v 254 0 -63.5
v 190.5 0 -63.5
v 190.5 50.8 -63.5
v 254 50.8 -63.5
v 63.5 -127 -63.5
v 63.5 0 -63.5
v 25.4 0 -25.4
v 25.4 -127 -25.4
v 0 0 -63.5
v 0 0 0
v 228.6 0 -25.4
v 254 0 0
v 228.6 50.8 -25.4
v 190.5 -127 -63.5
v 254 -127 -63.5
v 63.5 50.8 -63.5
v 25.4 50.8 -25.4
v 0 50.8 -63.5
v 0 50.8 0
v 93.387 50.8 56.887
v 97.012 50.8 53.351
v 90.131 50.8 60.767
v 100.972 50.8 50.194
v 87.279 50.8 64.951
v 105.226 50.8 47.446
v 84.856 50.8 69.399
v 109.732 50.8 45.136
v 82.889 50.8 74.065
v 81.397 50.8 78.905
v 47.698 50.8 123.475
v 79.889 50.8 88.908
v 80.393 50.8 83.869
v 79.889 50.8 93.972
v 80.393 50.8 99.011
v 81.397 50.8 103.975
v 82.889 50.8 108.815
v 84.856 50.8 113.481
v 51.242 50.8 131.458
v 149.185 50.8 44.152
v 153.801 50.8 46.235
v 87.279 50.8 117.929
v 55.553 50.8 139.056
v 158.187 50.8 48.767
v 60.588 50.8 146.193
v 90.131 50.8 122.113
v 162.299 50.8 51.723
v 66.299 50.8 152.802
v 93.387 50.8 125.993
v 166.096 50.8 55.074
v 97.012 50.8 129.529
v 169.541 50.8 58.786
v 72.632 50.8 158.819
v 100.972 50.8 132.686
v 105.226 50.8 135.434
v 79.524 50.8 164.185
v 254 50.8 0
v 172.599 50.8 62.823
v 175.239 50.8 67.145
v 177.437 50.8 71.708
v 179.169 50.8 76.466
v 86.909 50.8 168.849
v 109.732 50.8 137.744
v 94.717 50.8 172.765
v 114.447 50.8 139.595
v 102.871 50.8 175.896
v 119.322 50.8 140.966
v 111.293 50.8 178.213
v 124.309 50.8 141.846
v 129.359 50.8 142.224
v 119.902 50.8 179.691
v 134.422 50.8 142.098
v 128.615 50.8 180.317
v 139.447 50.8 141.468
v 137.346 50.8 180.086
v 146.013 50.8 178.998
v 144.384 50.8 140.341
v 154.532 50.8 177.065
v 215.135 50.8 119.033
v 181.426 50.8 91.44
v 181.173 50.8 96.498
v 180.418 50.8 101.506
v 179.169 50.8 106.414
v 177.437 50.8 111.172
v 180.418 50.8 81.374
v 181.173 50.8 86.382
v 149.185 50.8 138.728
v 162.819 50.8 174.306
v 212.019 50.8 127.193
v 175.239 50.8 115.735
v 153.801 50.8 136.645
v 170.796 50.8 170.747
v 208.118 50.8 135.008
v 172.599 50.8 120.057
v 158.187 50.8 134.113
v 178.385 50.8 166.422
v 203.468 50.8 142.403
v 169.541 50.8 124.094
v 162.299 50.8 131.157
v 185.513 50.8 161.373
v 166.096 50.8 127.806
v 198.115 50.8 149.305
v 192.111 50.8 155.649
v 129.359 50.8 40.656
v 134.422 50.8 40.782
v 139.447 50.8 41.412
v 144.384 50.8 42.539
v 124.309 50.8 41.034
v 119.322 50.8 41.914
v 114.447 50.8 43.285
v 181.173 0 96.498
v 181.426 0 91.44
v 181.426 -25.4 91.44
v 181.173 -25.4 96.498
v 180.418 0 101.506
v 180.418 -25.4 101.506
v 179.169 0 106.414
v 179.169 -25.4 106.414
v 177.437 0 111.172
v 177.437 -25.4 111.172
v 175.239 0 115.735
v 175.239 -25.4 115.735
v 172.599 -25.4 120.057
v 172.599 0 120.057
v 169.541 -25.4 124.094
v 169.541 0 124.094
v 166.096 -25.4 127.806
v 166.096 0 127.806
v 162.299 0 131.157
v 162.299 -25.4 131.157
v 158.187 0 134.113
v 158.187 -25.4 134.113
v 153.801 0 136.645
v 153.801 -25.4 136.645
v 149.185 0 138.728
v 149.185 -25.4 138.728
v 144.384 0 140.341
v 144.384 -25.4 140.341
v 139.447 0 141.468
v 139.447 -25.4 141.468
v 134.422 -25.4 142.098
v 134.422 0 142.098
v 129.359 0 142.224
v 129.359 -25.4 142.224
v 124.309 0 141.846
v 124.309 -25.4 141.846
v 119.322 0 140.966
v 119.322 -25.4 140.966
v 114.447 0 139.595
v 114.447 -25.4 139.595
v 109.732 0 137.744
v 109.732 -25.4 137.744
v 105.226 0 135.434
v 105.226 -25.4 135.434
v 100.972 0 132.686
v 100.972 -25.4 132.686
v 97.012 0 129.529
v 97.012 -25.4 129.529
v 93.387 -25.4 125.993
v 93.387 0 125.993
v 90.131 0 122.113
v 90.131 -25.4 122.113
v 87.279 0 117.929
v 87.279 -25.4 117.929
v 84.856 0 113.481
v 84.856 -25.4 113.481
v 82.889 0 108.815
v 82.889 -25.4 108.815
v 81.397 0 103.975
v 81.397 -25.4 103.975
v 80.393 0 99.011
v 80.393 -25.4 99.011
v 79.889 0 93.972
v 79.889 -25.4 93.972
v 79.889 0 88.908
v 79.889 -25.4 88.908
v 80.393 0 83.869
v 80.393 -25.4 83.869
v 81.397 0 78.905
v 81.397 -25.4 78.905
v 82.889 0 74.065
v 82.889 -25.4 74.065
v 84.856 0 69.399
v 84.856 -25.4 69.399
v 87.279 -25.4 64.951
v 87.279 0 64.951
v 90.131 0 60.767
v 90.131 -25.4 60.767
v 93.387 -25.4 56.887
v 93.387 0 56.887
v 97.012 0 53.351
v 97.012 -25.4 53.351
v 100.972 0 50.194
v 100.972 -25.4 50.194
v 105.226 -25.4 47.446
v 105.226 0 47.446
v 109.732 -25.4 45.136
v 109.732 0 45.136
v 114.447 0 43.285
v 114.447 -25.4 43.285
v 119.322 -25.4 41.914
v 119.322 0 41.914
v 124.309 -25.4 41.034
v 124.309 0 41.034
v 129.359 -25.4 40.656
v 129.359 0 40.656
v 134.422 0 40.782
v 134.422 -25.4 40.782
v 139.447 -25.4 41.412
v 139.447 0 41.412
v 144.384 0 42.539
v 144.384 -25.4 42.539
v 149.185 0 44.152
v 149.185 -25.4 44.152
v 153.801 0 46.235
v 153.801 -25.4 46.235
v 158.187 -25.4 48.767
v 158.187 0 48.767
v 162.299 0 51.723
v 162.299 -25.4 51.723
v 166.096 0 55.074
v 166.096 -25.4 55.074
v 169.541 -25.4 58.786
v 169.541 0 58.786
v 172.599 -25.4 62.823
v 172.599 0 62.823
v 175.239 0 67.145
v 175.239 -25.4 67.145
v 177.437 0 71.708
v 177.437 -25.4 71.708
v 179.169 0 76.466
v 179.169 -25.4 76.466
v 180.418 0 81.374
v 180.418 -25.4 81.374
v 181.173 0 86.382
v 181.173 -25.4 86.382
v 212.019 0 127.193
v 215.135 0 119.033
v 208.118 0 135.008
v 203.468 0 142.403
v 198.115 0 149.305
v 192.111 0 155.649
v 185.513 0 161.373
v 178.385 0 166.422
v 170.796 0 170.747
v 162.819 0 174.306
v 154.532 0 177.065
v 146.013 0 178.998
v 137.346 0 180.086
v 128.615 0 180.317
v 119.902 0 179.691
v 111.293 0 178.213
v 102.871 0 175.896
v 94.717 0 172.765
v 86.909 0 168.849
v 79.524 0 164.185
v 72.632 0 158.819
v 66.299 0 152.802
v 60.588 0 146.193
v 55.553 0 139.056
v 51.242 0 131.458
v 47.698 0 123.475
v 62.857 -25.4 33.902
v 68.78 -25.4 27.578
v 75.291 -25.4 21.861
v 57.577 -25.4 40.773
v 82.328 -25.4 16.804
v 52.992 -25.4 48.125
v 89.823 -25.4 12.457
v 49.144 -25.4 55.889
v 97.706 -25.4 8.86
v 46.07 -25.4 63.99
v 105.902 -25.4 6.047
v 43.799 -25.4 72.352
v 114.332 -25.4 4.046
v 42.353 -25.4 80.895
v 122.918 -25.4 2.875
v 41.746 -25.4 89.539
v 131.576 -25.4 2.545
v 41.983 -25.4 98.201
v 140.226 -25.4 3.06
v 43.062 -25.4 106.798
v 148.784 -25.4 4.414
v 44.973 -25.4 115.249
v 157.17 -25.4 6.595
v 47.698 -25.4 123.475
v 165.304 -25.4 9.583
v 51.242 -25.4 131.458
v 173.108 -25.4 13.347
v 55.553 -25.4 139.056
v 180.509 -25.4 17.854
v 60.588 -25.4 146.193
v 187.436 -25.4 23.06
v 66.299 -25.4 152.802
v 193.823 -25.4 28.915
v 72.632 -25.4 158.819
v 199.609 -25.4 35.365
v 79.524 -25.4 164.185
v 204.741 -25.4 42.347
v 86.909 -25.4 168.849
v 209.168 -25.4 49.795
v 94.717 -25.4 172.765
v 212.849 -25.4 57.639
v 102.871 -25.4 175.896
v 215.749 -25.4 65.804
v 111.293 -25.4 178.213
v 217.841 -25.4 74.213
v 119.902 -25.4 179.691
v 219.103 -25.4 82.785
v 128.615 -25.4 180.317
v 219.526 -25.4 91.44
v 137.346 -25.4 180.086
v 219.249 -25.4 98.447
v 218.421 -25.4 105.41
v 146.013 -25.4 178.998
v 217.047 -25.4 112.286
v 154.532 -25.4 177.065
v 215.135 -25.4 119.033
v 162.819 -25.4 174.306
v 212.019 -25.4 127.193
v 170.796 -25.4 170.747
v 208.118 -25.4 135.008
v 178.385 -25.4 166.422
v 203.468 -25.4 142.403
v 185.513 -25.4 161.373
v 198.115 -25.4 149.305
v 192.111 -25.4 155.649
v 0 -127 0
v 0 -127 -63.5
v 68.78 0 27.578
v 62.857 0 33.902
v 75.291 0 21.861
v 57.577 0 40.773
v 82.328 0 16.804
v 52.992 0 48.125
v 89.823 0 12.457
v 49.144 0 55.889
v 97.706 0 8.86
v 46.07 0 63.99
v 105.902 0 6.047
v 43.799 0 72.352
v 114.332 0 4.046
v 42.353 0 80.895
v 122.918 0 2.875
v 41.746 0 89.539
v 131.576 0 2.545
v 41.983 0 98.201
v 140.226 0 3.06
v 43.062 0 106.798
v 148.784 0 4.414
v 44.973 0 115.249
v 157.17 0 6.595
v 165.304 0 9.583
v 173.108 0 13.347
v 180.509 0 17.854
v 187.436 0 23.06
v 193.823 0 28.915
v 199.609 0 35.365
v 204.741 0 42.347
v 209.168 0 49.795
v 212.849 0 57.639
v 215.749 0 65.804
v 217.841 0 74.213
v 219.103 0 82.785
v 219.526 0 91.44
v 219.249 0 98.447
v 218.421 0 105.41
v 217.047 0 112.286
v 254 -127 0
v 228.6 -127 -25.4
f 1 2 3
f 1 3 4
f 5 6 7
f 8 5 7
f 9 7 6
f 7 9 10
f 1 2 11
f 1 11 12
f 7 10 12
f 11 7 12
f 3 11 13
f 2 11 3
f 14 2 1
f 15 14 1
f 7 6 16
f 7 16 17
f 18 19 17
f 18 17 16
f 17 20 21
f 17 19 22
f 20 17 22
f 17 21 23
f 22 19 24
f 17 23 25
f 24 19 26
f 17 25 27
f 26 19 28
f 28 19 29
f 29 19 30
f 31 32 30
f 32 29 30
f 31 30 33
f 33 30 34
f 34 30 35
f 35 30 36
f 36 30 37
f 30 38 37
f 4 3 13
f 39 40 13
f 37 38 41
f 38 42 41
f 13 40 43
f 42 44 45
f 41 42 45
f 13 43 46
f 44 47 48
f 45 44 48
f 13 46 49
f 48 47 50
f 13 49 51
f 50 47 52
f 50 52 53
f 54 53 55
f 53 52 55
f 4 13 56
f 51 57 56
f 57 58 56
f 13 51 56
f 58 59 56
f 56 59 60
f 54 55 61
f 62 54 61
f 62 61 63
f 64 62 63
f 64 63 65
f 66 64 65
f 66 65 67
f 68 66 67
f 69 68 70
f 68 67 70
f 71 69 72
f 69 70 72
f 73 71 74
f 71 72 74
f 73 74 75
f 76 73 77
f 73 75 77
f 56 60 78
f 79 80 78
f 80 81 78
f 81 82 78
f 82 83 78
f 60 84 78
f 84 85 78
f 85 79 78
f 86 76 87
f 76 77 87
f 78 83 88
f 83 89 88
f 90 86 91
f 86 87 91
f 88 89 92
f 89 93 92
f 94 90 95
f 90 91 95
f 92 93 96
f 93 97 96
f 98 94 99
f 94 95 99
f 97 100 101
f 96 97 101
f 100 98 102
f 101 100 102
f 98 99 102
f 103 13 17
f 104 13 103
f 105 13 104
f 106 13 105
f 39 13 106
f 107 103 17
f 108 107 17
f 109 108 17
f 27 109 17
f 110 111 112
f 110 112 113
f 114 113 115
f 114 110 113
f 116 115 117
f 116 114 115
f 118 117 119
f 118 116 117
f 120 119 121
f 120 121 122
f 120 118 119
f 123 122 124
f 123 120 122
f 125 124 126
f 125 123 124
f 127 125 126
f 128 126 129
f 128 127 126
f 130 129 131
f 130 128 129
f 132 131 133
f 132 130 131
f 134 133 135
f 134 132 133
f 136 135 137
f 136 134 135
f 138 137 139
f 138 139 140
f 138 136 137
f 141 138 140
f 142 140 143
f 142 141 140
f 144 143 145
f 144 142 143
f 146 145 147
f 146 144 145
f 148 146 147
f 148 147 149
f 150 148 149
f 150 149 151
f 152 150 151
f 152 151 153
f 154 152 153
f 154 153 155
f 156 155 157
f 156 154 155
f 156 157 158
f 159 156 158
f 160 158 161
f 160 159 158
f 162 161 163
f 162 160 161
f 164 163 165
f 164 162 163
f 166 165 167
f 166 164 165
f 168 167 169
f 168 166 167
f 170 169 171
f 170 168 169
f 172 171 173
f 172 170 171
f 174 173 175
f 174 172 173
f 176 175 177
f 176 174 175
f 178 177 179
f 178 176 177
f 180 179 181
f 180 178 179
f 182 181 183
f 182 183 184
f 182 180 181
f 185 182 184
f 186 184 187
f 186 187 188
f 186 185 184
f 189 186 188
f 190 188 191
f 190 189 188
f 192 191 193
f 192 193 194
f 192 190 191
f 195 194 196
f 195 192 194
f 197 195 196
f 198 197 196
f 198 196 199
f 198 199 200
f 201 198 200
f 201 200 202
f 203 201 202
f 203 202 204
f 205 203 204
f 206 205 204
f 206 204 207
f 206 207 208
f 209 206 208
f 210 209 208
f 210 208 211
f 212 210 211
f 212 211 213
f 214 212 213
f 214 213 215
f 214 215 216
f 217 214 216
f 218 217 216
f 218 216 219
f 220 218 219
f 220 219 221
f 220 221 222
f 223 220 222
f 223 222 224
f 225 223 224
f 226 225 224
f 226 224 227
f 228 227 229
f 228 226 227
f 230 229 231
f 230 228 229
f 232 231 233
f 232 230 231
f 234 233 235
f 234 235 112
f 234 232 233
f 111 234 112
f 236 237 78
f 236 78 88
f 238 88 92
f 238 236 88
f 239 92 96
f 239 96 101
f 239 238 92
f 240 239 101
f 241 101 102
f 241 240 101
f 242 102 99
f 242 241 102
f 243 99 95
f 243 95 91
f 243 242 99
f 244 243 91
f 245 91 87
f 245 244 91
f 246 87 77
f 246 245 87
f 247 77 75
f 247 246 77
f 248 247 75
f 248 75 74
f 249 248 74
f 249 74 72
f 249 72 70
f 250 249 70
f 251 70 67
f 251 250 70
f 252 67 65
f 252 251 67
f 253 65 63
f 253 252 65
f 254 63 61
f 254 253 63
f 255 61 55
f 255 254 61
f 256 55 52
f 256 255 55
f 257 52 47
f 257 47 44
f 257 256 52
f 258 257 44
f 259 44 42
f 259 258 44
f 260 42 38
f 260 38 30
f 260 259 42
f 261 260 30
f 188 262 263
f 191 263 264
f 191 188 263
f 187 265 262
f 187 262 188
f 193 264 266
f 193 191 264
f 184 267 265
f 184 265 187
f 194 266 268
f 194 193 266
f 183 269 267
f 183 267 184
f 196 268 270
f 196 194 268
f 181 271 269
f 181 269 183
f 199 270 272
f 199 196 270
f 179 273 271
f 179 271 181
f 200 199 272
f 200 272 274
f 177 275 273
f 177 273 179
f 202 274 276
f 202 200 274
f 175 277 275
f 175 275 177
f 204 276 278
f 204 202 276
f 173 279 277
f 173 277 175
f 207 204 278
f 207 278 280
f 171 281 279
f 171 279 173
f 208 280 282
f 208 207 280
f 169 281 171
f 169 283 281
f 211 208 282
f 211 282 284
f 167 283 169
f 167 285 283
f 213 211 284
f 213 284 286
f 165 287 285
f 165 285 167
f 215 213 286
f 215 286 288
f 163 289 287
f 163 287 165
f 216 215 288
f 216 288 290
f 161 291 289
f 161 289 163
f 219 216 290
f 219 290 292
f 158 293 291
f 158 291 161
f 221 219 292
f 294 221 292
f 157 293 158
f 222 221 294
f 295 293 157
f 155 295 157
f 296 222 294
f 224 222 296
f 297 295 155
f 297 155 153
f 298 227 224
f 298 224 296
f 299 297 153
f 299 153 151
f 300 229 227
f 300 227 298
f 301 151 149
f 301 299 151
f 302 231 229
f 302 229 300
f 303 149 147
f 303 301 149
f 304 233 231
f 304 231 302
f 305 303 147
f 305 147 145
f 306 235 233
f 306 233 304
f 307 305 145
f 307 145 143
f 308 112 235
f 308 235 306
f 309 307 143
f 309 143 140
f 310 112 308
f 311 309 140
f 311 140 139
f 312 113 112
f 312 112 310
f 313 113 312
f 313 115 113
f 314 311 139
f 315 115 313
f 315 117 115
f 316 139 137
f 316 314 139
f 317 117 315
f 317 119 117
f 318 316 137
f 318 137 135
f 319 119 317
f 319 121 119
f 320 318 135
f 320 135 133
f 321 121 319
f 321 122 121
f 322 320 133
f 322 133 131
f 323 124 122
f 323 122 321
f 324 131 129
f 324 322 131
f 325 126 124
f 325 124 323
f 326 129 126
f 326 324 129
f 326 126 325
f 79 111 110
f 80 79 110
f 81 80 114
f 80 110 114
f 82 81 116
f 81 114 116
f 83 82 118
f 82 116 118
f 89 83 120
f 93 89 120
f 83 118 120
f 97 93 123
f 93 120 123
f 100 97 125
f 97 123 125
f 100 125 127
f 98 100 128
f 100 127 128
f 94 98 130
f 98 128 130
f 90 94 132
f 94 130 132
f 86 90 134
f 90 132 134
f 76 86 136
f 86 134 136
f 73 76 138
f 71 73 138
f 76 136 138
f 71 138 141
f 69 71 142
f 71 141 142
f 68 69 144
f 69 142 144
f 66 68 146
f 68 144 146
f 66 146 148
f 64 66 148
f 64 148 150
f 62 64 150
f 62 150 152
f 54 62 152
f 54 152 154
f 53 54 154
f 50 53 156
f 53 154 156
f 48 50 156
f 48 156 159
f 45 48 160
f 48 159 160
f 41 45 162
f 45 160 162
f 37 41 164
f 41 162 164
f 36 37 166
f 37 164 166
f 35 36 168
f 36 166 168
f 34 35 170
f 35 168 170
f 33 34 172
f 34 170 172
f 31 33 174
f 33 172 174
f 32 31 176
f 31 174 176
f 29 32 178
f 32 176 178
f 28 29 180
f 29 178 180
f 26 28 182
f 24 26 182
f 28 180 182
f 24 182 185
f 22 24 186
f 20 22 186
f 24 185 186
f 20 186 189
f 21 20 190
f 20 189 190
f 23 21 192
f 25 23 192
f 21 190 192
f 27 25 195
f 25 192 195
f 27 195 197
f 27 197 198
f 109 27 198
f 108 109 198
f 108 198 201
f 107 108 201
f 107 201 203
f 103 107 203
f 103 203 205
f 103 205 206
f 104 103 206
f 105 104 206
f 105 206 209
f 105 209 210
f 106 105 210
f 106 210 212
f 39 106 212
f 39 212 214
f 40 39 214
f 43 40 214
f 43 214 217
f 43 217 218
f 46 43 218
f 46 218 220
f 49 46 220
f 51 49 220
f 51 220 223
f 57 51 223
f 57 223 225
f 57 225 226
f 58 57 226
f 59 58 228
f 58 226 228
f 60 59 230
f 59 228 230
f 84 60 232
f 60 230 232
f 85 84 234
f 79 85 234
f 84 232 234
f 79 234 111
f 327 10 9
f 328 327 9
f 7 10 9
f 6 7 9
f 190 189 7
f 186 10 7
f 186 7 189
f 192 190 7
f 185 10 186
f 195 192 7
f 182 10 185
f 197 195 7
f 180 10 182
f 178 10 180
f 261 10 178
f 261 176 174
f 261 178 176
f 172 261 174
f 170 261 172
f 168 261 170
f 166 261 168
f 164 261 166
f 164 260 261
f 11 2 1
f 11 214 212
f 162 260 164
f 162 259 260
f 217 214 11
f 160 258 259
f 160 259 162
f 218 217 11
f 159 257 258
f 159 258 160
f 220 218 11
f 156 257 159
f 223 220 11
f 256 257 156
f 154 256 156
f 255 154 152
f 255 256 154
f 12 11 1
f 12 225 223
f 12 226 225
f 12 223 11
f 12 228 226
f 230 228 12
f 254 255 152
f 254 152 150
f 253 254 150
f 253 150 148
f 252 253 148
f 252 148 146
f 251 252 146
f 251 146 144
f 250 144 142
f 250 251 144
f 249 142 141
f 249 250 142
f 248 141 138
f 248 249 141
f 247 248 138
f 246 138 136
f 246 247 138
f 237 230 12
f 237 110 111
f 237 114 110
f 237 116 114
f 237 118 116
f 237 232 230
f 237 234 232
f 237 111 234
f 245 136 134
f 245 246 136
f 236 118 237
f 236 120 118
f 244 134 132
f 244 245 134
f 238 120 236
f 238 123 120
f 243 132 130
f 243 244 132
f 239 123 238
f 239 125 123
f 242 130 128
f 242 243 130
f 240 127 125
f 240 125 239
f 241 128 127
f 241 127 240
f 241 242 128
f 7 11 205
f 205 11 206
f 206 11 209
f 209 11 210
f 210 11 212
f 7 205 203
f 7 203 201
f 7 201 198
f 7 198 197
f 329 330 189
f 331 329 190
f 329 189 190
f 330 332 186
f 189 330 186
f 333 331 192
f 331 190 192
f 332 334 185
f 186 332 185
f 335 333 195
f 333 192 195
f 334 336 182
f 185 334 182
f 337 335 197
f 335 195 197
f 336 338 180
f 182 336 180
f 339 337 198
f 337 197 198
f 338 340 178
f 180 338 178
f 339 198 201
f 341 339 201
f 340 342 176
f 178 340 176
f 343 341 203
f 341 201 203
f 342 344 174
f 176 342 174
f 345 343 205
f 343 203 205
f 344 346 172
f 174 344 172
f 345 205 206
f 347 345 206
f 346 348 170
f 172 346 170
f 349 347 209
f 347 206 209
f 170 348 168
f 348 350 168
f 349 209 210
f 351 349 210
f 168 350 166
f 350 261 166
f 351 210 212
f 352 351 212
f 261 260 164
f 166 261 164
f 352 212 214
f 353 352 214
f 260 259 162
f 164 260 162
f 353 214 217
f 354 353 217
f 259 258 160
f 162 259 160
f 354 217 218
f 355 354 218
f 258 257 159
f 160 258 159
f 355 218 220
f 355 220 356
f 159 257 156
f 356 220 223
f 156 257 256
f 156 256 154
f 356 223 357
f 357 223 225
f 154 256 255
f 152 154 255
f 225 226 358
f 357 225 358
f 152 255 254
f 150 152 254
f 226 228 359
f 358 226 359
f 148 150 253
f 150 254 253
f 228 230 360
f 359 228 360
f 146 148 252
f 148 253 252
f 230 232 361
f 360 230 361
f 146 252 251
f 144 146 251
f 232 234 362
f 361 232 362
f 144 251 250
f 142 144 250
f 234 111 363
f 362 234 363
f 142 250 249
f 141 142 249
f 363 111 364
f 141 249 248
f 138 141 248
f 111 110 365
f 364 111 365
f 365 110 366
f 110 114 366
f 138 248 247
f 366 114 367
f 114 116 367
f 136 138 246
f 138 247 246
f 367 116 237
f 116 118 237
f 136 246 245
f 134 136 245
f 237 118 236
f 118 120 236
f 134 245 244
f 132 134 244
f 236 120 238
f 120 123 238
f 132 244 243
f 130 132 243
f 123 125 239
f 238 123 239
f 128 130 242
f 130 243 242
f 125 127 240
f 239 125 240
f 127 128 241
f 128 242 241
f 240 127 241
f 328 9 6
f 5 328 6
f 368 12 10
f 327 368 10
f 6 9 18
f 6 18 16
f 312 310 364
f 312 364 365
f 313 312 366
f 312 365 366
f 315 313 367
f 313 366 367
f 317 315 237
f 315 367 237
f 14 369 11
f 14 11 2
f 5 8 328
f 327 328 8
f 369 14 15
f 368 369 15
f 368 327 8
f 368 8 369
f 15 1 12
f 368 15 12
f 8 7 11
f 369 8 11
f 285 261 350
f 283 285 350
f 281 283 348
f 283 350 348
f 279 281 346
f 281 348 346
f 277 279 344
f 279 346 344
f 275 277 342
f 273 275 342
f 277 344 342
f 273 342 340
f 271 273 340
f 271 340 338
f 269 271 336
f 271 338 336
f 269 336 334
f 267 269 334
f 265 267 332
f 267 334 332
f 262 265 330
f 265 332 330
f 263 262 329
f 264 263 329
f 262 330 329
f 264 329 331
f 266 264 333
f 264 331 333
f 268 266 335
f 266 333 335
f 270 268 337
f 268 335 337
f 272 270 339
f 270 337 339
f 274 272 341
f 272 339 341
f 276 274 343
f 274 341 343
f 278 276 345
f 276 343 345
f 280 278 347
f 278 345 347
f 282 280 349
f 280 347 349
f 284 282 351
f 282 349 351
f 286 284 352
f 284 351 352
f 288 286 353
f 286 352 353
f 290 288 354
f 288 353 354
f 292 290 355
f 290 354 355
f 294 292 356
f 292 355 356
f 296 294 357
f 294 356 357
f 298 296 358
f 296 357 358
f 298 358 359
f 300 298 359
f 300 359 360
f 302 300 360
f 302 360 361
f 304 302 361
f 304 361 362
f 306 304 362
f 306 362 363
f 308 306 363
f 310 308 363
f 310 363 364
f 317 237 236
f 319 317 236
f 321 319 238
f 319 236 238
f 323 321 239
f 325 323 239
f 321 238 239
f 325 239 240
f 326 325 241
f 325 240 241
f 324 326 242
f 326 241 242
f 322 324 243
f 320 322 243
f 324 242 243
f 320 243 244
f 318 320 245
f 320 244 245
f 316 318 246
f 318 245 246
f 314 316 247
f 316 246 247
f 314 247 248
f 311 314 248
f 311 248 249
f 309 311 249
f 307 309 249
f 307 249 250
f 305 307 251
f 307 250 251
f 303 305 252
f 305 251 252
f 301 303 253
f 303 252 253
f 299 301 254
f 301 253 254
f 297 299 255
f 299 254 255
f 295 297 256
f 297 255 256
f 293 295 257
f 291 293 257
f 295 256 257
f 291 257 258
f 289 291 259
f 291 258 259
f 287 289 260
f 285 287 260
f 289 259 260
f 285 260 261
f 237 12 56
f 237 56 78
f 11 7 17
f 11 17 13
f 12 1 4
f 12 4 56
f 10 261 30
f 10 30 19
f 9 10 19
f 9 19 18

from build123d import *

# Parameters (mm, degrees)
F1_DEPTH = 127
F0_R     = 50.8
F2_DEPTH = 25.4
F3_DEPTH = 50.8


with BuildPart() as f1:
    # F0 (on Front) → F1 (new body)
    with BuildSketch(Plane.XZ):
        Polygon((254, 0), (0, 0), (0, -63.5), (63.5, -63.5), (25.4, -25.4), (63.5, -25.4), (190.5, -25.4), (228.6, -25.4), (190.5, -63.5), (254, -63.5), align=None)
    extrude(amount=F1_DEPTH)


with BuildPart() as f2:
    # F0 (on Front) → F2 (new body)
    with BuildSketch(Plane.XZ):
        with BuildLine():
            ThreePointArc((215.135164, 119.032786), (132.983348, 180.308732), (47.69814, 123.474801))
            ThreePointArc((47.69814, 123.474801), (114.332316, 4.045862), (219.525708, 91.44))
            ThreePointArc((219.525708, 91.44), (218.42121, 105.409956), (215.135164, 119.032786))
        make_face()
        with Locations((130.625708, 91.44)):
            Circle(F0_R, mode=Mode.SUBTRACT)
    extrude(amount=F2_DEPTH)


with BuildPart() as f3:
    # F0 (on Front) → F3 (new body)
    with BuildSketch(Plane.XZ):
        with BuildLine():
            ThreePointArc((215.135164, 119.032786), (132.983348, 180.308732), (47.69814, 123.474801))
            ThreePointArc((47.69814, 123.474801), (114.332316, 4.045862), (219.525708, 91.44))
            ThreePointArc((219.525708, 91.44), (218.42121, 105.409956), (215.135164, 119.032786))
        make_face()
        with Locations((130.625708, 91.44)):
            Circle(F0_R, mode=Mode.SUBTRACT)
        with BuildLine():
            Line((47.69814, 123.474801), (0, 0))
            Line((0, 0), (254, 0))
            Line((254, 0), (215.135164, 119.032786))
            ThreePointArc((215.135164, 119.032786), (218.42121, 105.409956), (219.525708, 91.44))
            ThreePointArc((219.525708, 91.44), (114.332316, 4.045862), (47.69814, 123.474801))
        make_face()
        Polygon((254, 0), (0, 0), (0, -63.5), (63.5, -63.5), (25.4, -25.4), (63.5, -25.4), (190.5, -25.4), (228.6, -25.4), (190.5, -63.5), (254, -63.5), align=None)
    extrude(amount=-F3_DEPTH)


solid = Compound([f1.part, f2.part, f3.part])
